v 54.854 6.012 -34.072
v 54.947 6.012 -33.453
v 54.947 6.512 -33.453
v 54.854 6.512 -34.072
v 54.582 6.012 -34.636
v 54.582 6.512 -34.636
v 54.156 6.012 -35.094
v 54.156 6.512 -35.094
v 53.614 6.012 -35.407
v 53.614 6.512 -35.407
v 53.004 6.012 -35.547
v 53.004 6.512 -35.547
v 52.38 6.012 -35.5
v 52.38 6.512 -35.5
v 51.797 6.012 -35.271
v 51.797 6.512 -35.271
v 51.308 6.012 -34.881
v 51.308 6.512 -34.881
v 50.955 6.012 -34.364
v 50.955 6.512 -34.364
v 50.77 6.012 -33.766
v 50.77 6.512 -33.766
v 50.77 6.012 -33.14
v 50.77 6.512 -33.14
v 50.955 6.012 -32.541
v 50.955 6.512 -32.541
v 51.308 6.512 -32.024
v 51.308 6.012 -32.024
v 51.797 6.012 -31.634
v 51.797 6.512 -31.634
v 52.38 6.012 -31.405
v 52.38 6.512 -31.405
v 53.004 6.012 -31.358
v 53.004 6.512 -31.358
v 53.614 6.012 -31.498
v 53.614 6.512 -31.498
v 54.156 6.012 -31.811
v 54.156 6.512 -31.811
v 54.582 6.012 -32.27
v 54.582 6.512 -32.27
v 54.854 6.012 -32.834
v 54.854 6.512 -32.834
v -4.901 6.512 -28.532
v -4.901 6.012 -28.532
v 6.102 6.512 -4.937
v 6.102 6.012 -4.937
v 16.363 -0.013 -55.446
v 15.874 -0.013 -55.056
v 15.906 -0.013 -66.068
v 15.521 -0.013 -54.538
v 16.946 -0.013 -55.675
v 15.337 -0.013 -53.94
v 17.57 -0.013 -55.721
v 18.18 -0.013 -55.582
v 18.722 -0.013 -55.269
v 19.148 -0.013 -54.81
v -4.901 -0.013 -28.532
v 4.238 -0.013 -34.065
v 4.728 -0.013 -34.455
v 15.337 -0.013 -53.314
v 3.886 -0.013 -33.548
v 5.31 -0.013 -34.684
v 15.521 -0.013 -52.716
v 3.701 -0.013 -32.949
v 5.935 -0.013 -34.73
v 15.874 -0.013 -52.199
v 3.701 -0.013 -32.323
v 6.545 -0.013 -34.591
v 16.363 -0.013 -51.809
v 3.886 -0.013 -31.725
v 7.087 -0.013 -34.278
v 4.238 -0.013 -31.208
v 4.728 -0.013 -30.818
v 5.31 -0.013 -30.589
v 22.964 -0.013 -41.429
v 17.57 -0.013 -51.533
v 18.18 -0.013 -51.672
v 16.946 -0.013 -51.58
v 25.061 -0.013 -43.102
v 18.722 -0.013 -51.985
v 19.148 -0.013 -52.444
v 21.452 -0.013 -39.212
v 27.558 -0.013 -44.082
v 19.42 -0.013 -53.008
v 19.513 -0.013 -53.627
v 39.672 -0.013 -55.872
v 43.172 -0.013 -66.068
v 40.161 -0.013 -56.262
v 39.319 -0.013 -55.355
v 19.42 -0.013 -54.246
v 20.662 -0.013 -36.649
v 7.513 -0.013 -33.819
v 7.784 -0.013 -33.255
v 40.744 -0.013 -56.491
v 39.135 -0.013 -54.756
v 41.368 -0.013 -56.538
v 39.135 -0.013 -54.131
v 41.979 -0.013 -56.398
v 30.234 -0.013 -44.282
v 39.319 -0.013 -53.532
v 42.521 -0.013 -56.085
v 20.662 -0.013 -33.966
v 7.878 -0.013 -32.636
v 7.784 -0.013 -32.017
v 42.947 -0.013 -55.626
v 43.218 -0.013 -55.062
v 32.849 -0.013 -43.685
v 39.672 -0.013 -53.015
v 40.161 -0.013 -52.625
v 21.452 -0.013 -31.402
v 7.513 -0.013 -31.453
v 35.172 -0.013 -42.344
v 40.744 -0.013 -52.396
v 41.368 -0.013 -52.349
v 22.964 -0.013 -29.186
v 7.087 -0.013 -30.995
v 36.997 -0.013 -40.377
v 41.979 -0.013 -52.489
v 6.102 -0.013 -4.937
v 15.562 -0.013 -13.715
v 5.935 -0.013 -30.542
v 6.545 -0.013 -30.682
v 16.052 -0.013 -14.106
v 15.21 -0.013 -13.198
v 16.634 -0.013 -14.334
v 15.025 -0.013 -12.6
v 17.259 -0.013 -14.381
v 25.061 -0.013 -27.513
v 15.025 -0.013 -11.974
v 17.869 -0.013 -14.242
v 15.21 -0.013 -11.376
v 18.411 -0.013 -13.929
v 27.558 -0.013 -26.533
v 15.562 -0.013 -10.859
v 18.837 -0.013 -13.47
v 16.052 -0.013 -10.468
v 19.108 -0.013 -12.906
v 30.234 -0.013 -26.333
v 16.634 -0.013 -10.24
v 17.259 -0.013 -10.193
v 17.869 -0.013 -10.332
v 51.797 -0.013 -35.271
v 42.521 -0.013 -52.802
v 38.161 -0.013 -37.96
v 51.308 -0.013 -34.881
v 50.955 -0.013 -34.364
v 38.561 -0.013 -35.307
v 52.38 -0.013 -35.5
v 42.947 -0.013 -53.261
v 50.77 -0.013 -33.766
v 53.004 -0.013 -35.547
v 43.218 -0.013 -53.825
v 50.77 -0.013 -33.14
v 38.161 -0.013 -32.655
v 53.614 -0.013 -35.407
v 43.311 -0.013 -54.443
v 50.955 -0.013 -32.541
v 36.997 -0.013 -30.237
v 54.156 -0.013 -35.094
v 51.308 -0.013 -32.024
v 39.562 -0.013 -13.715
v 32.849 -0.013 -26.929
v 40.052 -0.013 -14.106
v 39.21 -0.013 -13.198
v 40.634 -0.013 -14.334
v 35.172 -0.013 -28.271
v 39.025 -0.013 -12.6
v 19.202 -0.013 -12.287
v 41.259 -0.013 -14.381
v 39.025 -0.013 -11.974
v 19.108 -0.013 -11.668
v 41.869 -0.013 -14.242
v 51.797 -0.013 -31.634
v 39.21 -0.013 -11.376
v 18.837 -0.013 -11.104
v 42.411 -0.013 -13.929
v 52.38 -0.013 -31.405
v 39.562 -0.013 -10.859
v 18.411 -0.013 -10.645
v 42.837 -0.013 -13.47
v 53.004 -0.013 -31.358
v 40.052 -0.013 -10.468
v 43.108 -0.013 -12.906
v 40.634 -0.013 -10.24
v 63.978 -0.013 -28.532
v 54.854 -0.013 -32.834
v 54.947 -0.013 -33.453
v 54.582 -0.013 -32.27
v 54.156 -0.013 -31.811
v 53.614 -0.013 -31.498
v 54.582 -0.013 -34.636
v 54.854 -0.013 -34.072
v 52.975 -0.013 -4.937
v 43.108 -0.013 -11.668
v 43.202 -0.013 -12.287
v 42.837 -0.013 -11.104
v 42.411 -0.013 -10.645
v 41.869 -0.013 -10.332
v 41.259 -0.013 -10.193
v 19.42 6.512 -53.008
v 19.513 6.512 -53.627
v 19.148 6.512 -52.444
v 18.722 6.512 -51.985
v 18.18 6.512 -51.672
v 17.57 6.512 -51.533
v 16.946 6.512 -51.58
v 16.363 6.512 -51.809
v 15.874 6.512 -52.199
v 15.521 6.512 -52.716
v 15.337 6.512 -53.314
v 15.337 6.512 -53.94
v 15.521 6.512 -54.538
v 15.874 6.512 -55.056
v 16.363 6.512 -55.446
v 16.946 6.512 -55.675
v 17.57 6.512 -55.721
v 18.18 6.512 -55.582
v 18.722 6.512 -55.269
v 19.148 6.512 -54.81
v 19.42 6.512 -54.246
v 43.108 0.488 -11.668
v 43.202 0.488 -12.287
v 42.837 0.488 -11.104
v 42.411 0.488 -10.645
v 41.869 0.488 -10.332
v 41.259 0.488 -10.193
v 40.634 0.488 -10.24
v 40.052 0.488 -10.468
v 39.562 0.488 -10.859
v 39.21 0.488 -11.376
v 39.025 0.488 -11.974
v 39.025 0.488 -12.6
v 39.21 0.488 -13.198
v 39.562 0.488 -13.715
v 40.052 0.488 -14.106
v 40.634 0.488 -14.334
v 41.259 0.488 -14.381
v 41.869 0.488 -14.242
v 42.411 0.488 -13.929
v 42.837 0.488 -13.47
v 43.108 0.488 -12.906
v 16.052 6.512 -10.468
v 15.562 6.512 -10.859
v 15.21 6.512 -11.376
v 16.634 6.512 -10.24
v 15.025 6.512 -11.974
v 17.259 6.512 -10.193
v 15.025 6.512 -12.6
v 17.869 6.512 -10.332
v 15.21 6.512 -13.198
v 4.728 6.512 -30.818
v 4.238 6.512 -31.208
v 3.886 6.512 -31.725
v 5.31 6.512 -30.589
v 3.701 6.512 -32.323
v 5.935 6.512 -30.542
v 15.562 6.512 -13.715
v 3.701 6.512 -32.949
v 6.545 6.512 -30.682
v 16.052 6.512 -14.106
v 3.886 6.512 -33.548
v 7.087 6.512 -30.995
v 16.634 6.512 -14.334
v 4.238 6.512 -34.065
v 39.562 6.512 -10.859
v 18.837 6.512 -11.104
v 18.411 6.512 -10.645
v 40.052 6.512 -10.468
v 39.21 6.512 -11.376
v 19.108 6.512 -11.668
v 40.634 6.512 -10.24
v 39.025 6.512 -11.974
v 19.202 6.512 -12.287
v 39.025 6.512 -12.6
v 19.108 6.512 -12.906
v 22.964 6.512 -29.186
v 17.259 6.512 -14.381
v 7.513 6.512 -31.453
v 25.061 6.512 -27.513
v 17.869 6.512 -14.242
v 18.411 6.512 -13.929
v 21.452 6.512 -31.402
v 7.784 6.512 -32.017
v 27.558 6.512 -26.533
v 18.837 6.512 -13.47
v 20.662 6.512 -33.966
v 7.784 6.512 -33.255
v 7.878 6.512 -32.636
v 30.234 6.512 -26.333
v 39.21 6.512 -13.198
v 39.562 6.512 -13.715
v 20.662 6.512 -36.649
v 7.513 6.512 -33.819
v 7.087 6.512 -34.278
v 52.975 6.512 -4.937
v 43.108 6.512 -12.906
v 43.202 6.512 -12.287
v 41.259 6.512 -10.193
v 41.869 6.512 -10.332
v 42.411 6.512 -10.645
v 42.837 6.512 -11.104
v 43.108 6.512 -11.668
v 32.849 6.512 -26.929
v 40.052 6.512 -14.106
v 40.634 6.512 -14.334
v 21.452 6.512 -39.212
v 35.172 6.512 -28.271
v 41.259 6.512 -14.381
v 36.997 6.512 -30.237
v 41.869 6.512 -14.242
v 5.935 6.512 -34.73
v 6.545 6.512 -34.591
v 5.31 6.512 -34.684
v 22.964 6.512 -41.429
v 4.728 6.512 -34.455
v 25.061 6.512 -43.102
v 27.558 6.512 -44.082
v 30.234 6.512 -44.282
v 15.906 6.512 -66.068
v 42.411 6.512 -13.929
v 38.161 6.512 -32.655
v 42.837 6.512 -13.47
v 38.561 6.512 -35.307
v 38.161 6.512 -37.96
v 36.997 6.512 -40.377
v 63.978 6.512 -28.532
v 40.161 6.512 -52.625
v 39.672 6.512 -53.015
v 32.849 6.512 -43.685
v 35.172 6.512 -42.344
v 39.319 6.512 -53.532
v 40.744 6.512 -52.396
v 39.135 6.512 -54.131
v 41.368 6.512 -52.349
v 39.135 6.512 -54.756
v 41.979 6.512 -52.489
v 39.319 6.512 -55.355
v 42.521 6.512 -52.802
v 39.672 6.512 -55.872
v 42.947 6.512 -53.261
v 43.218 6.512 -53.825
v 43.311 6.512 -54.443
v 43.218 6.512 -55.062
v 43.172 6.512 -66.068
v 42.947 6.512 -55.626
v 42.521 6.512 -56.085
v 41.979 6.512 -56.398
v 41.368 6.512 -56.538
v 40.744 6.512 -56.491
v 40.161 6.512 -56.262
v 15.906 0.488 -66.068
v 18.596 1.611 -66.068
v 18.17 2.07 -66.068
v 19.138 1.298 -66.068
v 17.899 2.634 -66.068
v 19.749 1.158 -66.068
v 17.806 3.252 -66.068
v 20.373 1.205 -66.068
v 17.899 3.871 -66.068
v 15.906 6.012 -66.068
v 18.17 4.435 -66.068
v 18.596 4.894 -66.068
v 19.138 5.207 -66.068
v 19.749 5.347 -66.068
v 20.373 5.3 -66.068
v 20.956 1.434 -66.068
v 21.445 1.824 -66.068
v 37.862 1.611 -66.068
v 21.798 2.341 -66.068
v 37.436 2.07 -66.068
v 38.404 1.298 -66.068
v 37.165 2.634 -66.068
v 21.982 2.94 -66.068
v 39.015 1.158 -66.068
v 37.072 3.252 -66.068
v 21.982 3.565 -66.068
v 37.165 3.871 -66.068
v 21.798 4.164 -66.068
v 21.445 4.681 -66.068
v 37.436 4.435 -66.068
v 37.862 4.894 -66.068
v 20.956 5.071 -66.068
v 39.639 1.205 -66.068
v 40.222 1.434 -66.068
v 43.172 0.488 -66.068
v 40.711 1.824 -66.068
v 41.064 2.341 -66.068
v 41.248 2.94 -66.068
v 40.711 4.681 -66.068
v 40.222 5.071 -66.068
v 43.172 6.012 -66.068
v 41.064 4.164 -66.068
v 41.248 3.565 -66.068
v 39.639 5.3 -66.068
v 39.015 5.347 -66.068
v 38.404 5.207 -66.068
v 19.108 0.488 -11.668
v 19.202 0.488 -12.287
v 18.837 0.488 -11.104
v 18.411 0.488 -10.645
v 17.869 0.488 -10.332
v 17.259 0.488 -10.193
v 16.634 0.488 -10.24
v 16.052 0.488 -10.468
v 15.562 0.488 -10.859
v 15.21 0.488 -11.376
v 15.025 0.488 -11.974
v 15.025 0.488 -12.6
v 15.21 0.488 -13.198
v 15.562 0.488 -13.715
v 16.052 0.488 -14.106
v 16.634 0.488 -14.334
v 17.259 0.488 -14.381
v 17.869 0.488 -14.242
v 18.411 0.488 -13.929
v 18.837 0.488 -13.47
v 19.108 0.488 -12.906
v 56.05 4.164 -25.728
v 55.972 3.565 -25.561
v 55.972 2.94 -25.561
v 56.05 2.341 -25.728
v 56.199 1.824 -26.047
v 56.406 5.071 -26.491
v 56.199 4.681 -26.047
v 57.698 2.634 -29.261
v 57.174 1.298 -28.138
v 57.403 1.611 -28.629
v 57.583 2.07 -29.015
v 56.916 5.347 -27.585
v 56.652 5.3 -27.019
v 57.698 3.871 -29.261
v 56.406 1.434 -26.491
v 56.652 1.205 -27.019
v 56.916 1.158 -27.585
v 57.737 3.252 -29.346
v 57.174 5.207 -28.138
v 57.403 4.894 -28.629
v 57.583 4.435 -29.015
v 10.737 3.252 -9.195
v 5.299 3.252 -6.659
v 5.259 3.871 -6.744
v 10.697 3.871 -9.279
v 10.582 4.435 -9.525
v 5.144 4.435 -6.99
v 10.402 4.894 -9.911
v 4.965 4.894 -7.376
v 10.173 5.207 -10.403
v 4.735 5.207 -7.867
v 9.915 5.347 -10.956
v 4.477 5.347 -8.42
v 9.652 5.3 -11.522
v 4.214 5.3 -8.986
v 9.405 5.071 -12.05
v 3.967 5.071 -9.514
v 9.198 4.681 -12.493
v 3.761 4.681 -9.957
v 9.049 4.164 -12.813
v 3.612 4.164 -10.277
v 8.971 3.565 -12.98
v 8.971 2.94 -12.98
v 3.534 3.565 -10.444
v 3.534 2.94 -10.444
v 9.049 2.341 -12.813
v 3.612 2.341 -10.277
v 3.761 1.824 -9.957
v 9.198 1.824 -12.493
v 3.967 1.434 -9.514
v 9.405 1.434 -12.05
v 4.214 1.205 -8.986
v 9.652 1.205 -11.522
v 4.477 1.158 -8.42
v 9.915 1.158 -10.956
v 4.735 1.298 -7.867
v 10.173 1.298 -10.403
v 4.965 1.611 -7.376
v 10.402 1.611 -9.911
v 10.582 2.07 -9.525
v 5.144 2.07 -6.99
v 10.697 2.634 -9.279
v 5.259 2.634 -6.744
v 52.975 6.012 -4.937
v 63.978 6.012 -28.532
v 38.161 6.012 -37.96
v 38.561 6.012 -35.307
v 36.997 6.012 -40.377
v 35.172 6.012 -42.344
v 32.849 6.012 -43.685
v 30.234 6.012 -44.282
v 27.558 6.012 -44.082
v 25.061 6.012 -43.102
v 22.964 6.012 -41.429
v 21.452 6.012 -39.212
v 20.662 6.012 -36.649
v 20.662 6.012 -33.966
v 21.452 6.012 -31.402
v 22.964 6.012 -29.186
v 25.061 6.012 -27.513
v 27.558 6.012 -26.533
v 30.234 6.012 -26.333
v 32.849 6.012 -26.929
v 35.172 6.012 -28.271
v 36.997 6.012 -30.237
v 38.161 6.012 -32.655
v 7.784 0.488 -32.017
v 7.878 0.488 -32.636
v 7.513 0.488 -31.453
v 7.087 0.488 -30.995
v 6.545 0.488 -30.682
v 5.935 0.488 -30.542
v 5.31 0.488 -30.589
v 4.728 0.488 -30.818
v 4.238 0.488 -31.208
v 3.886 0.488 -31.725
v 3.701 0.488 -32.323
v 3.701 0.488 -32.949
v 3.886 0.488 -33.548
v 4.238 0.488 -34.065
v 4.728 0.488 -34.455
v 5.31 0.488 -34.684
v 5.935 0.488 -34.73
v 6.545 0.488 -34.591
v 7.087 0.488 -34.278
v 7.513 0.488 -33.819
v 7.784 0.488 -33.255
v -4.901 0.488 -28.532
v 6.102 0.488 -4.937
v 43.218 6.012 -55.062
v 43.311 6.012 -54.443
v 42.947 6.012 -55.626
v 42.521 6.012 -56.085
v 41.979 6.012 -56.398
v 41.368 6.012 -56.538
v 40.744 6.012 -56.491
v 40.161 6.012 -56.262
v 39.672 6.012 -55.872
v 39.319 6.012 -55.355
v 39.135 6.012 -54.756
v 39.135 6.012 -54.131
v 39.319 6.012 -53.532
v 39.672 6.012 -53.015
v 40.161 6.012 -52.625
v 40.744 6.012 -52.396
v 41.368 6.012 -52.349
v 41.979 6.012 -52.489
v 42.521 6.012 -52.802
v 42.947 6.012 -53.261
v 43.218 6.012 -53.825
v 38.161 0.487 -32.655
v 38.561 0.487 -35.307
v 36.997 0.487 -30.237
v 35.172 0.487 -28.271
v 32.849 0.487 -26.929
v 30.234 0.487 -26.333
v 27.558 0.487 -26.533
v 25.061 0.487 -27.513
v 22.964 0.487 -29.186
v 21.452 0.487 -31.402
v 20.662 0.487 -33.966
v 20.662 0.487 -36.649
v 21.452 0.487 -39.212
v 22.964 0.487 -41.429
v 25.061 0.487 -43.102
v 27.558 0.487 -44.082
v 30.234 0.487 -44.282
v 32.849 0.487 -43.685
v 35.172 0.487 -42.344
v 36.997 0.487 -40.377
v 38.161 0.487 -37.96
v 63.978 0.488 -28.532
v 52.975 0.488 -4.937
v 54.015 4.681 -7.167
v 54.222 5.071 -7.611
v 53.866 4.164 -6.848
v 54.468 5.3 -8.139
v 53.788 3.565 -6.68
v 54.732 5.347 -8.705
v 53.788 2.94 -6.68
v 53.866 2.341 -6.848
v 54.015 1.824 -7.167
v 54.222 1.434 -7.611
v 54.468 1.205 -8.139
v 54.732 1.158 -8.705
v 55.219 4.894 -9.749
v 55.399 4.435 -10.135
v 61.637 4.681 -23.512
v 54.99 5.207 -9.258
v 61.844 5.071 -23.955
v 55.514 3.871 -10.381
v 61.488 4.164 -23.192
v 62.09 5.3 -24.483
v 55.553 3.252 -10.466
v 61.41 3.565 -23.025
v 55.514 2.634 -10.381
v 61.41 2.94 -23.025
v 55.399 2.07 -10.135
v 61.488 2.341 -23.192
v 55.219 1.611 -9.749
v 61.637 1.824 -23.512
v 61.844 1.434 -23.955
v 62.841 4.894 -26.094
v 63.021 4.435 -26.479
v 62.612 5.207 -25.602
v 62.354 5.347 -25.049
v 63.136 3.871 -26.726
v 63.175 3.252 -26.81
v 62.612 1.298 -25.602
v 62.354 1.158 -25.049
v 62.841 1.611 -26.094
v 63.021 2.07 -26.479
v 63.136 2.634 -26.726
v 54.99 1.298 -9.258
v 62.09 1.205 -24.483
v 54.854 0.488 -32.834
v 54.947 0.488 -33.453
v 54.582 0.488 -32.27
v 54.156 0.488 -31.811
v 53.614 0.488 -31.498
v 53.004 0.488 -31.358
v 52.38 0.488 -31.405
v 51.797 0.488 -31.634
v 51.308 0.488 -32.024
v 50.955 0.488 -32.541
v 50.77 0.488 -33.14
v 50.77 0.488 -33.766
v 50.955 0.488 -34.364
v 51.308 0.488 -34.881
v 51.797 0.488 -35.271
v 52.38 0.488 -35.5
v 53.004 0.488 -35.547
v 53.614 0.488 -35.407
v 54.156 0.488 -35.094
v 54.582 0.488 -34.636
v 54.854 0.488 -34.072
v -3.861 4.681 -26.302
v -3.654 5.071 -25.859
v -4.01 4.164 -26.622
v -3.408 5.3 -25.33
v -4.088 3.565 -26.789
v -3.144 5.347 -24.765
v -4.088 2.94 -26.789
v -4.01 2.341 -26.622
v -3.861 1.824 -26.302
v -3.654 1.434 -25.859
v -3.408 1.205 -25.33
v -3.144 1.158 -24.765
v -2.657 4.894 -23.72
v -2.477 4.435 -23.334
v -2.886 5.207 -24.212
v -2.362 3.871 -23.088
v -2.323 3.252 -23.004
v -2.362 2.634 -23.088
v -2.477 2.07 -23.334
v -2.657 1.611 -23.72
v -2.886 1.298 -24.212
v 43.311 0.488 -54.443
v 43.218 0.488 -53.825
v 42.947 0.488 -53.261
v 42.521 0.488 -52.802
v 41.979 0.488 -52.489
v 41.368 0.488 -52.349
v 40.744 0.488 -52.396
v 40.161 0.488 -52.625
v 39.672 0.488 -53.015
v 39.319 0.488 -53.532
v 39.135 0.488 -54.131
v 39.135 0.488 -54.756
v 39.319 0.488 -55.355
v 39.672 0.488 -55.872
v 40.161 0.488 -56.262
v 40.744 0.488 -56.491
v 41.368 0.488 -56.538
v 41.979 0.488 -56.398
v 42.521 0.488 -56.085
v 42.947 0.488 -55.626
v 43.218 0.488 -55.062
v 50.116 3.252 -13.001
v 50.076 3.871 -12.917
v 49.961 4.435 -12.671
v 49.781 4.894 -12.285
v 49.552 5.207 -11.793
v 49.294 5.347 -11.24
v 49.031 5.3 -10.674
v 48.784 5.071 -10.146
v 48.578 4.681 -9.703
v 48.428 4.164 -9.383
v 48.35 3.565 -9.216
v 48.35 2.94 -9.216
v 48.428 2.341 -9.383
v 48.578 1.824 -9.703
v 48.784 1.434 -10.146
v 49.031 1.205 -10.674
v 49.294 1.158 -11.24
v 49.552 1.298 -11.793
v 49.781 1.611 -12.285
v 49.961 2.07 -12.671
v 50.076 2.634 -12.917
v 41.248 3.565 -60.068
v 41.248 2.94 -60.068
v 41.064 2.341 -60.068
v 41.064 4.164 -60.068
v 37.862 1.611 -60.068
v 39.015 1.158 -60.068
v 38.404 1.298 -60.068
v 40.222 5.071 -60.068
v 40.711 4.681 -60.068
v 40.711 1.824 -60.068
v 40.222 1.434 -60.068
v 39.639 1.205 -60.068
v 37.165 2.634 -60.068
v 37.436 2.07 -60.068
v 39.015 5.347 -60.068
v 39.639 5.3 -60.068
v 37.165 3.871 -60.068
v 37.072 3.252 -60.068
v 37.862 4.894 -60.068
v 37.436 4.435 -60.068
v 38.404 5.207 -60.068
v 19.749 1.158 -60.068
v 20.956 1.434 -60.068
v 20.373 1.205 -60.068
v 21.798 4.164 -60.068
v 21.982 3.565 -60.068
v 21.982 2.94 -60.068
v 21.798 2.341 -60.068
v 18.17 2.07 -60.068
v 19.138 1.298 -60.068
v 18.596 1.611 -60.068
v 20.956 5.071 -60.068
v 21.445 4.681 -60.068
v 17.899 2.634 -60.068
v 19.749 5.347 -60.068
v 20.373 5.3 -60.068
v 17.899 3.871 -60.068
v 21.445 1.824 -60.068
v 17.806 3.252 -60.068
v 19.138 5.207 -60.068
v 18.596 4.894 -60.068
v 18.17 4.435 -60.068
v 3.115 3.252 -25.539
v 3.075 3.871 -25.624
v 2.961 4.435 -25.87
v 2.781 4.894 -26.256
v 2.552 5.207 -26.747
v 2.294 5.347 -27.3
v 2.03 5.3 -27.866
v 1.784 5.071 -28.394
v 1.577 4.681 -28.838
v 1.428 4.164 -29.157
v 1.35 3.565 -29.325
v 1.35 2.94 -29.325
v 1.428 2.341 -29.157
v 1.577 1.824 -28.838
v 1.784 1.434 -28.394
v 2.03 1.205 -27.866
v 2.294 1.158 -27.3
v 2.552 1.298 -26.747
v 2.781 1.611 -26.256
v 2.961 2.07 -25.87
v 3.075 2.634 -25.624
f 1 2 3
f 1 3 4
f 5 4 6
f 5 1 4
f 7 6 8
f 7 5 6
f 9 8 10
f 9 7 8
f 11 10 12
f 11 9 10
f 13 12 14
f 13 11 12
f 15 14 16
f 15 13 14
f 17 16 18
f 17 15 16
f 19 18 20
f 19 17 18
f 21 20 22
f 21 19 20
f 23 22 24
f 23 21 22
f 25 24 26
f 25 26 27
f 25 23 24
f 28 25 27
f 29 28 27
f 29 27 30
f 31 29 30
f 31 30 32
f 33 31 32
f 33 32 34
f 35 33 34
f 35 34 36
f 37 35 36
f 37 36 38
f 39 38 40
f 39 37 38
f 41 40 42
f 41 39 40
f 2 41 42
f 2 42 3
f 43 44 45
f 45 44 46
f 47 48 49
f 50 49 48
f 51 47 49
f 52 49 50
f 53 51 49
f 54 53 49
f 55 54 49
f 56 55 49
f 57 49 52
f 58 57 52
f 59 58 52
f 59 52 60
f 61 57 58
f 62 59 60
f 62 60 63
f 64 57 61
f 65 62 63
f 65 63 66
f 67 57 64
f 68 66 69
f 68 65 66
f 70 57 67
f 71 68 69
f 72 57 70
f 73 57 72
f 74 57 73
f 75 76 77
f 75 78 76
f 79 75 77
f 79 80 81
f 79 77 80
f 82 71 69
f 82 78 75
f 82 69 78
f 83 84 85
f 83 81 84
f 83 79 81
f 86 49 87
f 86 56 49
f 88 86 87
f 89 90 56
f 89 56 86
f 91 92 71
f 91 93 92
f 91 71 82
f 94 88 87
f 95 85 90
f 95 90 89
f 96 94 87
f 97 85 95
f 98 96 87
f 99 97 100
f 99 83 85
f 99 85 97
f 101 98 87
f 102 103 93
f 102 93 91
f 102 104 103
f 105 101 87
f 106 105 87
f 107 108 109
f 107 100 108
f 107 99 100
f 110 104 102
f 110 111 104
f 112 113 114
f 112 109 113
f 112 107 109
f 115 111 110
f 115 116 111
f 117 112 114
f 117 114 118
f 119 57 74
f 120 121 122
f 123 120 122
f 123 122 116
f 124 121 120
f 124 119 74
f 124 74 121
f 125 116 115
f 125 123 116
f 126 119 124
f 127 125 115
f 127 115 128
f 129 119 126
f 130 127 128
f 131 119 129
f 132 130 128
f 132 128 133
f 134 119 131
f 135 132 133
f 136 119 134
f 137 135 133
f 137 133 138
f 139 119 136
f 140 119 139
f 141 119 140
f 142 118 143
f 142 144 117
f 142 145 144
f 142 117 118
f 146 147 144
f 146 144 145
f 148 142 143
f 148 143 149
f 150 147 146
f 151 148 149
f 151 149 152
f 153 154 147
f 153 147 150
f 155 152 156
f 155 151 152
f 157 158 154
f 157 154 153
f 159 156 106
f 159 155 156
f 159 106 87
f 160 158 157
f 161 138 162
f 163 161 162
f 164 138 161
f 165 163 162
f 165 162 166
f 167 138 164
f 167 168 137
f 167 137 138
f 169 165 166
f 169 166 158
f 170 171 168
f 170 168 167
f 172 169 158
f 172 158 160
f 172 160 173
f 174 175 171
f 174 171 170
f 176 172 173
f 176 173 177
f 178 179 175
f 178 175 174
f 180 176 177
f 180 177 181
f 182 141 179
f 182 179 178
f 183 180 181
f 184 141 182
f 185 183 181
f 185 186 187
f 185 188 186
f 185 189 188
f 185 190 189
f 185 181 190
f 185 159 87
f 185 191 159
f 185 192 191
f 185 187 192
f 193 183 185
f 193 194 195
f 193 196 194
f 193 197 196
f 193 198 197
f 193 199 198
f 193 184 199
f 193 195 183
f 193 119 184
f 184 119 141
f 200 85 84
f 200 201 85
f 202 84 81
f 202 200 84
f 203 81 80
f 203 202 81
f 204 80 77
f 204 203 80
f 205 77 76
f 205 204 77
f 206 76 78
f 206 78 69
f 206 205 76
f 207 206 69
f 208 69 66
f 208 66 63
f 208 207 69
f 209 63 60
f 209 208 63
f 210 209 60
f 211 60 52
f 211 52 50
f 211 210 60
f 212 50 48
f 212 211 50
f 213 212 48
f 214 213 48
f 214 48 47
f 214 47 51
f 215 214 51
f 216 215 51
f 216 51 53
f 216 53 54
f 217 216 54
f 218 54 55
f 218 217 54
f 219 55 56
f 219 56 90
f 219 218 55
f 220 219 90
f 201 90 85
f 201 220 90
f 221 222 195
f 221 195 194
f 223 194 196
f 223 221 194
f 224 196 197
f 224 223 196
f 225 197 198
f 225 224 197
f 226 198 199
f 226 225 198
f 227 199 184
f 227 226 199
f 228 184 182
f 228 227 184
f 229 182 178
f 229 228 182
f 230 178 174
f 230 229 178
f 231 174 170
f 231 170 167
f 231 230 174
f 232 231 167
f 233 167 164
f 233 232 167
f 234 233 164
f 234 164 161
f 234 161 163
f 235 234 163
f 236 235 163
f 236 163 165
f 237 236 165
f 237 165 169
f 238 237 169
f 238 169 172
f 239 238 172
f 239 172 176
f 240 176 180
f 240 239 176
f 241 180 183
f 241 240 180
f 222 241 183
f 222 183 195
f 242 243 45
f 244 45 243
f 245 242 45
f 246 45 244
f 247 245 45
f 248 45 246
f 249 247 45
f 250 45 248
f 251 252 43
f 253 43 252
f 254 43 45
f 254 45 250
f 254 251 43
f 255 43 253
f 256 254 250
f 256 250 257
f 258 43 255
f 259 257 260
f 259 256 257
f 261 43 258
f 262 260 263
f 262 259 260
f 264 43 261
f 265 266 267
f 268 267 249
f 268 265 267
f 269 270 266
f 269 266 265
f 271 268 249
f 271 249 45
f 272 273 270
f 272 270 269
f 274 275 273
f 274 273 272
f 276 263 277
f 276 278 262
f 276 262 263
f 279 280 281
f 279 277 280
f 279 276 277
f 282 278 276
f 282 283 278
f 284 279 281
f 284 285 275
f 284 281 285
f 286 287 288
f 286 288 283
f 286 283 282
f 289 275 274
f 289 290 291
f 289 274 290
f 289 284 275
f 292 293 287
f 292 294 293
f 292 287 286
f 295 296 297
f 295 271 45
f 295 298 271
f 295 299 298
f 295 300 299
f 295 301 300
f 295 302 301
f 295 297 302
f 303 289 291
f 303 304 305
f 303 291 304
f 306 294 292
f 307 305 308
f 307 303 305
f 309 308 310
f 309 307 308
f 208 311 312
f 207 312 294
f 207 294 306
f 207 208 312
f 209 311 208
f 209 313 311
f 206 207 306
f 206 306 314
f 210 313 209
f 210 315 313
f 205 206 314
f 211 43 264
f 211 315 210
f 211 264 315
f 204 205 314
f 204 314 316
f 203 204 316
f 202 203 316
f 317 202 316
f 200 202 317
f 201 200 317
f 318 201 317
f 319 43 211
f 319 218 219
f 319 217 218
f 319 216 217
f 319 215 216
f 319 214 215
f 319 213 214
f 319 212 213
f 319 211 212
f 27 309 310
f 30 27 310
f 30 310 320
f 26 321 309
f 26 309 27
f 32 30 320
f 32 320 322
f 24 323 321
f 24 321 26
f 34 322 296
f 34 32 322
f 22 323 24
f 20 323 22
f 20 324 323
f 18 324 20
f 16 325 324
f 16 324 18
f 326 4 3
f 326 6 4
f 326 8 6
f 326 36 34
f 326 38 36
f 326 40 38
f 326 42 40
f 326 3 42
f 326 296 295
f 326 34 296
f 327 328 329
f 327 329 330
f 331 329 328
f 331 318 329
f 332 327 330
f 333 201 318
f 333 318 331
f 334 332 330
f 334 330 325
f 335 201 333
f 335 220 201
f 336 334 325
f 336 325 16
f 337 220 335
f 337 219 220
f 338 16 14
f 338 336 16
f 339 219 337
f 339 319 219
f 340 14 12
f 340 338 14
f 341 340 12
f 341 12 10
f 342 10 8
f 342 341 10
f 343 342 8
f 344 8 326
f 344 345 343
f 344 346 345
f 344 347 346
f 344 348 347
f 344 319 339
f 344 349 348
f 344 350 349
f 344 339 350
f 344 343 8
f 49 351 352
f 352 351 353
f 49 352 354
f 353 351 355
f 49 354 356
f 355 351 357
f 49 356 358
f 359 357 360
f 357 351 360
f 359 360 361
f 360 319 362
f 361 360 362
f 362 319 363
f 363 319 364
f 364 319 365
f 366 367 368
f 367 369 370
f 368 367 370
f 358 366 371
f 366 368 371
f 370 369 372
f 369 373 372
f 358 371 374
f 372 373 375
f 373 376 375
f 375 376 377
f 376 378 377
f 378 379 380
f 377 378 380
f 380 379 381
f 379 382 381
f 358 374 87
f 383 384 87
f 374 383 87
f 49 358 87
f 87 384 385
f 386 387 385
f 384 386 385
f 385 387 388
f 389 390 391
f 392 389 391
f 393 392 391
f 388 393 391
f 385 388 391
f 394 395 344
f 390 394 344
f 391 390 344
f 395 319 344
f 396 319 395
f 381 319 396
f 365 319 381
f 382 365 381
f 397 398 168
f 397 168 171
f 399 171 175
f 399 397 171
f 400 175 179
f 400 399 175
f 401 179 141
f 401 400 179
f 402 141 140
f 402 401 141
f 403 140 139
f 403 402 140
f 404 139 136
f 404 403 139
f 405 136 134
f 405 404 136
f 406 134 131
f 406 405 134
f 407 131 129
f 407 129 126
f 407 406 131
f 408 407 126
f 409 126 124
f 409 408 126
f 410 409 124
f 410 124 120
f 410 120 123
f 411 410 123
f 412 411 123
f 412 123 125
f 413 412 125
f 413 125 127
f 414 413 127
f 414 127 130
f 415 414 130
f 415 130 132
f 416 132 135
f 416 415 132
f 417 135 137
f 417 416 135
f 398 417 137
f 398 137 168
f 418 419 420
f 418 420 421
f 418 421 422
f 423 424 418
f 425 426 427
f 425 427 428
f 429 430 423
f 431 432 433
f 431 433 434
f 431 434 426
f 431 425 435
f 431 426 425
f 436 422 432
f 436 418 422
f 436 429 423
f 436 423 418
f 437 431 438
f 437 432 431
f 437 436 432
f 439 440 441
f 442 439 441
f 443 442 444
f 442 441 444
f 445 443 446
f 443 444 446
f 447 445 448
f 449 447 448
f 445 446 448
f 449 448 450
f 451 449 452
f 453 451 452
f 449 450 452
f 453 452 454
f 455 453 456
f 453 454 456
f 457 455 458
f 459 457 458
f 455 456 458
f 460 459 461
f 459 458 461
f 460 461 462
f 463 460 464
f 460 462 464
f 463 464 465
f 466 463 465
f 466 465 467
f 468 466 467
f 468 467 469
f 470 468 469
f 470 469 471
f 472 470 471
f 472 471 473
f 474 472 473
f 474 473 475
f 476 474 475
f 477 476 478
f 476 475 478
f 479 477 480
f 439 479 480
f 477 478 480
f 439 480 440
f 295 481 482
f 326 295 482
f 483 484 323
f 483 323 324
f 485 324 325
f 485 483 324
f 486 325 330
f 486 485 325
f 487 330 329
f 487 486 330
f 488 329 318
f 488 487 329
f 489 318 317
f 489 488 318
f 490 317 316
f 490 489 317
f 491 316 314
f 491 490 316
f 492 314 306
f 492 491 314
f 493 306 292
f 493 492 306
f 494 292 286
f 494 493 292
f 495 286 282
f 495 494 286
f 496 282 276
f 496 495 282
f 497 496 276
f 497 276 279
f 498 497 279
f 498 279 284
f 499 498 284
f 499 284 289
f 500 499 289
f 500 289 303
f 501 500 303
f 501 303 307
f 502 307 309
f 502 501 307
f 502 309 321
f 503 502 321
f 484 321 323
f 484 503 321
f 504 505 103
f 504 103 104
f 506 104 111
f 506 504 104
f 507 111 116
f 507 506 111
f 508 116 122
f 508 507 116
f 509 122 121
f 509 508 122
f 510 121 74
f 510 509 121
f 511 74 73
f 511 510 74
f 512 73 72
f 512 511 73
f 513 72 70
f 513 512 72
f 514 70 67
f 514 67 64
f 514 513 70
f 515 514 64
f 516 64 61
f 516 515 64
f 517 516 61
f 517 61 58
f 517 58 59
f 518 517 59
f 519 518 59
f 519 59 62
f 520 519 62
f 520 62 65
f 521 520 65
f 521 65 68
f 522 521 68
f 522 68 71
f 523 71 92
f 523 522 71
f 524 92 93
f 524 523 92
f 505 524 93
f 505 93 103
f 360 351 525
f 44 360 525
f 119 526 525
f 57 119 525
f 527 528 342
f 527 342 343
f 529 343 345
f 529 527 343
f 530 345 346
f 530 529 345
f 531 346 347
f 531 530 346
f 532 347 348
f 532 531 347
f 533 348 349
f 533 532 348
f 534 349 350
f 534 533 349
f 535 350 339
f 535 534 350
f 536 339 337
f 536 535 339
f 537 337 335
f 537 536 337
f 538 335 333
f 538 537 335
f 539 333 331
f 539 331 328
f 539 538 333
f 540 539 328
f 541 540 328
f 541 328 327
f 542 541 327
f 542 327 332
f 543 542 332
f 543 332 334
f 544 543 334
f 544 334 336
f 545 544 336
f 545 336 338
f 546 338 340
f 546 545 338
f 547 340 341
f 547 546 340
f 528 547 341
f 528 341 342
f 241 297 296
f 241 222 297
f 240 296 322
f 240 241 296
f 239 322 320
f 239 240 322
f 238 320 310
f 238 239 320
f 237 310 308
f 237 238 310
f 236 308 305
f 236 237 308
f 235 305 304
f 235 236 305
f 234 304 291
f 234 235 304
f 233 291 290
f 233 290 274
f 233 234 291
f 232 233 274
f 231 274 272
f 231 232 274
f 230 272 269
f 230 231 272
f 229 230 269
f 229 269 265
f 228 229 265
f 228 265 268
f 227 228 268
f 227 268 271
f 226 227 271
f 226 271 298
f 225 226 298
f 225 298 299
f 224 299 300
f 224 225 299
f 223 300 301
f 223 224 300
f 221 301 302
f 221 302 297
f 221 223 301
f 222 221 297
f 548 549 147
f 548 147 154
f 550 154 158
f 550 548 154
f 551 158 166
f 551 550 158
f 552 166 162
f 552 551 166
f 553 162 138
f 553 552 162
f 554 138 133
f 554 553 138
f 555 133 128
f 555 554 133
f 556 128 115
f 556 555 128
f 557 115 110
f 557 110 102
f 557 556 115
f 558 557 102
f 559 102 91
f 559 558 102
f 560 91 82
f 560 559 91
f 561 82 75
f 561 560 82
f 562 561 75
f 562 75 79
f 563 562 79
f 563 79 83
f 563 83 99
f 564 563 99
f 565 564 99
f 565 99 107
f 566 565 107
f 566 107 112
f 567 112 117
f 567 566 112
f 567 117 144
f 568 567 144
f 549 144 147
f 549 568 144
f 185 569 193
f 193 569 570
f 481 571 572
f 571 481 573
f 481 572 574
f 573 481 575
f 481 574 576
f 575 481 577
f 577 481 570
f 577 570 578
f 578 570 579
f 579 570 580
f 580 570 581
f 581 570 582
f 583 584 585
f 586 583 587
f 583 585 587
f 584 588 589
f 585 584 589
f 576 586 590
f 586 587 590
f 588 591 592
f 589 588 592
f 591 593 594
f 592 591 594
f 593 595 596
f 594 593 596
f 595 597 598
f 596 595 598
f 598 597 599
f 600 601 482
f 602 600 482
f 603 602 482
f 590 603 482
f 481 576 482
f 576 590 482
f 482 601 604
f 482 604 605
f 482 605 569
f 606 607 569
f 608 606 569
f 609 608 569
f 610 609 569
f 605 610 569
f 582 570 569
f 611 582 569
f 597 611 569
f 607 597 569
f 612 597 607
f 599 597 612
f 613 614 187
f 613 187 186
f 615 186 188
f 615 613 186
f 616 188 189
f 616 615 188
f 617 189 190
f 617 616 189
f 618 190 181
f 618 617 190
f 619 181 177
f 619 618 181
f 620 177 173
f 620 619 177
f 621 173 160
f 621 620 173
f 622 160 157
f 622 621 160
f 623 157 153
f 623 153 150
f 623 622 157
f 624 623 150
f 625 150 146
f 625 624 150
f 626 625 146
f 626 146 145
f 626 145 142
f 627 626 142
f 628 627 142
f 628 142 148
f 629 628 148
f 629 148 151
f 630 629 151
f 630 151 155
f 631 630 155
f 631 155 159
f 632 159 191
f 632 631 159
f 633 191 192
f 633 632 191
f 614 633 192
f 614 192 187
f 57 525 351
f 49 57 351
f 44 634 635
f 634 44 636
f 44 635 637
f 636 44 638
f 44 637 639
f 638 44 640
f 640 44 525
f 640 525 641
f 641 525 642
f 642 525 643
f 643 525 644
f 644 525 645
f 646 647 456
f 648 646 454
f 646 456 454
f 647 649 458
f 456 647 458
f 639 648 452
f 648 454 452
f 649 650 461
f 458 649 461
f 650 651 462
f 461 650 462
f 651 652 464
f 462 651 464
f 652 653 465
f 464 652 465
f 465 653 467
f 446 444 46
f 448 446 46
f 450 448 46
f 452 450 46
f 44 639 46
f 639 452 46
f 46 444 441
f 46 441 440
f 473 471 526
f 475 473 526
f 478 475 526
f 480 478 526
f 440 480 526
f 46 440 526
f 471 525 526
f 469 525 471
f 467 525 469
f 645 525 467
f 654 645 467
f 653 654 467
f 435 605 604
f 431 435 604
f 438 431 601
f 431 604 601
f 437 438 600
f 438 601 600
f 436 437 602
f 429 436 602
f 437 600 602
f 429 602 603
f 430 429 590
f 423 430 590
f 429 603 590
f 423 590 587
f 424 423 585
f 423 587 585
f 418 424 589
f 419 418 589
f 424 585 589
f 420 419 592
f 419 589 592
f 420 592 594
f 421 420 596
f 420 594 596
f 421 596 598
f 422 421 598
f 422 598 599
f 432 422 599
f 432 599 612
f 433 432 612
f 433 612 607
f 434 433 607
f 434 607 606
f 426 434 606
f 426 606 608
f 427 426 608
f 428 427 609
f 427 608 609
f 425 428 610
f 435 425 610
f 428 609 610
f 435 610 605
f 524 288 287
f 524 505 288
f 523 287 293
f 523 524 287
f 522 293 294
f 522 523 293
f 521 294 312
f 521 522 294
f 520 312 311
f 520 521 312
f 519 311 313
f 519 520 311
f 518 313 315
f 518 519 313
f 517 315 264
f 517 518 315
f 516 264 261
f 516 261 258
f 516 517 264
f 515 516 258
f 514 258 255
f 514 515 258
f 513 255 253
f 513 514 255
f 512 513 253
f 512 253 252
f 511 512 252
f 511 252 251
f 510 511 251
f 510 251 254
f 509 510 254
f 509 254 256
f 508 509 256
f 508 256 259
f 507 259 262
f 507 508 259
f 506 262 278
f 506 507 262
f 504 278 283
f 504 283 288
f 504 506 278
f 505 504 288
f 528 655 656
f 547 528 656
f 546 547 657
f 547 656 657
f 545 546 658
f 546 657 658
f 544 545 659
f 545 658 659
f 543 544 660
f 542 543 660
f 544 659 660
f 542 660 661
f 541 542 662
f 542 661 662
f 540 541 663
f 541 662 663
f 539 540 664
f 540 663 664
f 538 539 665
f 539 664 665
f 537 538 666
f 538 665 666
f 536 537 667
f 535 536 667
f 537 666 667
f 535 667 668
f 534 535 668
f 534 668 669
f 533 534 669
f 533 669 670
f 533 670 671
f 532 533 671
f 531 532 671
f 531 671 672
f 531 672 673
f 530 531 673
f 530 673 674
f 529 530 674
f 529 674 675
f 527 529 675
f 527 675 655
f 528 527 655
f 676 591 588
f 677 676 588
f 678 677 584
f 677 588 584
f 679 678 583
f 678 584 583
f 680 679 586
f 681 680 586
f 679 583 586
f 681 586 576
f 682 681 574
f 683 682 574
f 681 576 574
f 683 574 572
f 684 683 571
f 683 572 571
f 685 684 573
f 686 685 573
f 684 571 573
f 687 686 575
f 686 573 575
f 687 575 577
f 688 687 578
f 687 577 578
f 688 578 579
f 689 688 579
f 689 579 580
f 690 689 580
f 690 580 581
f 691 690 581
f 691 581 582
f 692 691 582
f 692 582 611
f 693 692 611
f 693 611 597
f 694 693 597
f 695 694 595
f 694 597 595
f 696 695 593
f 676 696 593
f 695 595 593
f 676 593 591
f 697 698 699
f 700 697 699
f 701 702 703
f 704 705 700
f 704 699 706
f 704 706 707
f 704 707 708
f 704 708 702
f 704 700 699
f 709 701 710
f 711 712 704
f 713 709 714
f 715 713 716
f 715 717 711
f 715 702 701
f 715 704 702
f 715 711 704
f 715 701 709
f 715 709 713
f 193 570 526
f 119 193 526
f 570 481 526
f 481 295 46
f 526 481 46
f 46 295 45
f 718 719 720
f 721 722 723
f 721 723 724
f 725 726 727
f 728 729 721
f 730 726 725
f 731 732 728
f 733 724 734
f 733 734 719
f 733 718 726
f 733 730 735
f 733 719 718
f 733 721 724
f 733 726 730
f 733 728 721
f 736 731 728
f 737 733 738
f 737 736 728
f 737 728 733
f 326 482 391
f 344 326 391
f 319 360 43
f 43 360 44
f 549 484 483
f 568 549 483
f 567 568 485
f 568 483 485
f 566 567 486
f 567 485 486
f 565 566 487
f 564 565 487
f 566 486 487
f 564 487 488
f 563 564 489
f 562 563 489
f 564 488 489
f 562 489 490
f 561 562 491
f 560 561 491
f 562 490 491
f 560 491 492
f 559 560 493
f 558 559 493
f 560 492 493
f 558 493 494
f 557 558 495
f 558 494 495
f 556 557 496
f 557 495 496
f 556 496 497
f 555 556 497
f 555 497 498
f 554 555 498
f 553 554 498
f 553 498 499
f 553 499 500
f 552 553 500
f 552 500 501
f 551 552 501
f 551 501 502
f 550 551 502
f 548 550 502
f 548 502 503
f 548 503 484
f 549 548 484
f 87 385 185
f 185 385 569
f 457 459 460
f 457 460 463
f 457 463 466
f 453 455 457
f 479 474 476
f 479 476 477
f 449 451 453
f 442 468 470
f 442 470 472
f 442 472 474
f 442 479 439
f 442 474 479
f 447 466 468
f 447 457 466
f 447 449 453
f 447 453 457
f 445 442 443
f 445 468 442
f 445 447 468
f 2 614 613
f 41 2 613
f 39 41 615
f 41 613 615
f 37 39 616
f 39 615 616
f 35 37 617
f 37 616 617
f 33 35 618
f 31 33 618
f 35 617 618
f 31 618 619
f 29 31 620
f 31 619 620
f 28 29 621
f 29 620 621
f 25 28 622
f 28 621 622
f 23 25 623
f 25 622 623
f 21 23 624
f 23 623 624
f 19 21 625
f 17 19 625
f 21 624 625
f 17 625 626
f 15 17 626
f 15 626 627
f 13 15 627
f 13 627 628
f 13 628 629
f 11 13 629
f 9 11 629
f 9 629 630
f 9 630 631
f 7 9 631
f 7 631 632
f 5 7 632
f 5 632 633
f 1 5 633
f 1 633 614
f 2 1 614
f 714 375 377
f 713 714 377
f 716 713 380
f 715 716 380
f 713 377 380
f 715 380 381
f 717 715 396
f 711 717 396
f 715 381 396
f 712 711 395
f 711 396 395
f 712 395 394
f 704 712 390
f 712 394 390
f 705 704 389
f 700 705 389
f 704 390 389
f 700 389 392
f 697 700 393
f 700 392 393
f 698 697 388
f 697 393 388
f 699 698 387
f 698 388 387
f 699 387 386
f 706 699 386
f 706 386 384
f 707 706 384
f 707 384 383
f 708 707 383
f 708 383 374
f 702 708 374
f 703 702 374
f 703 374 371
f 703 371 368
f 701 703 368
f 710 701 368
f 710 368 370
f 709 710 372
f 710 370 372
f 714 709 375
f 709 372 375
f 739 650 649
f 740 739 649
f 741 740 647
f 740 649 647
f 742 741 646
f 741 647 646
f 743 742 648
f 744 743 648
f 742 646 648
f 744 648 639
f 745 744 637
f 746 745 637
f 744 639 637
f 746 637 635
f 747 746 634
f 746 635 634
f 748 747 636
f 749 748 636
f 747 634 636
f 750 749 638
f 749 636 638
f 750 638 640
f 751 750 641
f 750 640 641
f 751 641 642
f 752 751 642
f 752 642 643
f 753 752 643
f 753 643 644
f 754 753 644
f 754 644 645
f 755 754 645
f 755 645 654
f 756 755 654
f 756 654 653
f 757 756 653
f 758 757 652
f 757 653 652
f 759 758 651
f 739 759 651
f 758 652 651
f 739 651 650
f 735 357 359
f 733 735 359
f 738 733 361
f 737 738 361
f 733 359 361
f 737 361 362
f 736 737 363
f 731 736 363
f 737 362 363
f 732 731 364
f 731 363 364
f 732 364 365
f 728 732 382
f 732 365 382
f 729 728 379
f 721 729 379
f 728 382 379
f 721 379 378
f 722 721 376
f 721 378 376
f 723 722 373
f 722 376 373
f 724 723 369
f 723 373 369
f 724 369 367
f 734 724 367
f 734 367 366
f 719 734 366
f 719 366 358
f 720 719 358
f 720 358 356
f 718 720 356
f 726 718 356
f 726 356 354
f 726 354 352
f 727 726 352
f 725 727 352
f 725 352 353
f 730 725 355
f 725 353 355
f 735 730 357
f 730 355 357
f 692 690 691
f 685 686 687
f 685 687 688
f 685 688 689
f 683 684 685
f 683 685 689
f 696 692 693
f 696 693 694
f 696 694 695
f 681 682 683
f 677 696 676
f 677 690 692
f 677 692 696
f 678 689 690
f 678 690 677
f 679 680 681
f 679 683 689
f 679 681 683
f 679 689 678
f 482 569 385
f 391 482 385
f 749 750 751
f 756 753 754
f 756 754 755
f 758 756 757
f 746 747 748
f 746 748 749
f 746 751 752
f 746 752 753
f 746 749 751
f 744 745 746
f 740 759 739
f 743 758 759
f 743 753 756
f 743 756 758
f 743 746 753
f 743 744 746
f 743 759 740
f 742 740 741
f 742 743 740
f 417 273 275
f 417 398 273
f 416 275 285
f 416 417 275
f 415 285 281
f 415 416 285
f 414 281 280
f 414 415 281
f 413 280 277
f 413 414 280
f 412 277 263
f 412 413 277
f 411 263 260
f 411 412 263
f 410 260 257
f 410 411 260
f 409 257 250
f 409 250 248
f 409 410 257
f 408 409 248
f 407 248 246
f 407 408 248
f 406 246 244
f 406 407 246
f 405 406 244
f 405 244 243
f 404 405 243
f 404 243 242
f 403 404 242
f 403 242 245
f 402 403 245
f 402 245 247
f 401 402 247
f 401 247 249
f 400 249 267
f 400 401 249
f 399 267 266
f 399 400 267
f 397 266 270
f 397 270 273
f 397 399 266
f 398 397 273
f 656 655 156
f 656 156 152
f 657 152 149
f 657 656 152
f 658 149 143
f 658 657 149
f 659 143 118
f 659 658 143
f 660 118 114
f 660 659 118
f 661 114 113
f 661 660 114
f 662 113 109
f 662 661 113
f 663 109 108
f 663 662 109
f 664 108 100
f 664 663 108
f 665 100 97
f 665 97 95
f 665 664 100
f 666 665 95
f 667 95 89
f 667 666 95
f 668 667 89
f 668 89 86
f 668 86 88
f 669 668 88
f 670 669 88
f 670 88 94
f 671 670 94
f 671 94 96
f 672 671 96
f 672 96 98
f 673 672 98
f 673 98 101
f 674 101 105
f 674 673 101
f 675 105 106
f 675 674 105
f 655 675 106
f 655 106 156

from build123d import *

# Parameters (mm, degrees)
BOSS_EXTRUDE1_DEPTH = 6.5
SCALE1_SCALE        = 0.85
SKETCH2_R           = 9
CUT_EXTRUDE1_DEPTH  = 10
SKETCH7_R           = 2.1
CUT_EXTRUDE7_DEPTH  = 6
SKETCH8_R           = 2.1
CUT_EXTRUDE8_DEPTH  = 6
SKETCH9_R           = 2.1
CUT_EXTRUDE9_DEPTH  = 6
SKETCH10_R          = 2.1
CUT_EXTRUDE10_DEPTH = 10
SKETCH12_R          = 2.1
SKETCH12_R_2        = 9
BOSS_EXTRUDE2_DEPTH = 0.5
SKETCH13_R          = 2.1
SKETCH13_R_2        = 9
BOSS_EXTRUDE3_DEPTH = 0.5


with BuildPart() as part:
    # Sketch1 → Boss-Extrude1 (new body)
    with BuildSketch(Plane(origin=(0, 0, 0), x_dir=(1, 0, 0), z_dir=(0, 1, 0))):
        Polygon((1.965722873, 0), (57.111381005, 0), (70.055583492, 27.758931813), (45.577412376, 71.918721468), (13.499691502, 71.918721468), (-10.978479614, 27.758931813), align=None)
    extrude(amount=BOSS_EXTRUDE1_DEPTH)


with BuildPart() as part_1:
    # Scale1: scaled about (29.538551939, 3.25, -32.913795141)
    add(part.part.scale(SCALE1_SCALE).moved(Location((4.430782791, 0.4875, -4.937069271))))

    # Sketch2 → Cut-Extrude1 (cut)
    with BuildSketch(Plane(origin=(0, 6.0125, 0), x_dir=(1, 0, 0), z_dir=(0, 1, 0))):
        with Locations((29.561028759, 35.307348014)):
            Circle(SKETCH2_R)
    extrude(amount=-CUT_EXTRUDE1_DEPTH, mode=Mode.SUBTRACT)

    # Sketch7 → Cut-Extrude7 (cut)
    with BuildSketch(Plane(origin=(6.902862477, 0, -3.218857636), x_dir=(0.422618262, 0, 0.906307787), z_dir=(-0.906307787, 0, 0.422618262))):
        with Locations((-23.930140333, 3.2525)):
            Circle(SKETCH7_R)
        with Locations((-5.895836778, 3.2525)):
            Circle(SKETCH7_R)
    extrude(amount=-CUT_EXTRUDE7_DEPTH, mode=Mode.SUBTRACT)

    # Sketch8 → Cut-Extrude8 (cut)
    with BuildSketch(Plane(origin=(0, 0, -66.067982519), x_dir=(-1, 0, 0), z_dir=(0, 0, -1))):
        with Locations((-39.17158331, 3.2525)):
            Circle(SKETCH8_R)
        with Locations((-19.905520568, 3.2525)):
            Circle(SKETCH8_R)
    extrude(amount=-CUT_EXTRUDE8_DEPTH, mode=Mode.SUBTRACT)

    # Sketch9 → Cut-Extrude9 (cut)
    with BuildSketch(Plane(origin=(41.622704657, 0, 19.408985935), x_dir=(0.422618262, 0, -0.906307787), z_dir=(0.906307787, 0, 0.422618262))):
        with Locations((30.862899728, 3.2525)):
            Circle(SKETCH9_R)
        with Locations((48.897203282, 3.2525)):
            Circle(SKETCH9_R)
    extrude(amount=-CUT_EXTRUDE9_DEPTH, mode=Mode.SUBTRACT)

    # Sketch10 → Cut-Extrude10 (cut)
    with BuildSketch(Plane.XZ.offset(-0.4875)):
        with Locations((41.211489709, -54.443494734)):
            Circle(SKETCH10_R)
        with Locations((52.846920595, -33.452621763)):
            Circle(SKETCH10_R)
        with Locations((17.41315777, -53.627241783)):
            Circle(SKETCH10_R)
        with Locations((5.777726884, -32.636368812)):
            Circle(SKETCH10_R)
        with Locations((17.101647233, -12.287069271)):
            Circle(SKETCH10_R)
        with Locations((41.101647233, -12.287069271)):
            Circle(SKETCH10_R)
    extrude(amount=-CUT_EXTRUDE10_DEPTH, mode=Mode.SUBTRACT)

    # Sketch12 → Boss-Extrude2 (add)
    with BuildSketch(Plane(origin=(0, 6.0125, 0), x_dir=(1, 0, 0), z_dir=(0, 1, 0))):
        Polygon((-4.900924881, 28.532161313), (6.101647233, 4.937069271), (52.975456645, 4.937069271), (63.978028759, 28.532161313), (43.17158331, 66.067982519), (15.905520568, 66.067982519), align=None)
        with Locations((17.101647233, 12.287069271)):
            Circle(SKETCH12_R, mode=Mode.SUBTRACT)
        with Locations((41.211489709, 54.443494734)):
            Circle(SKETCH12_R, mode=Mode.SUBTRACT)
        with Locations((29.561028759, 35.307348014)):
            Circle(SKETCH12_R_2, mode=Mode.SUBTRACT)
        with Locations((5.777726884, 32.636368812)):
            Circle(SKETCH12_R, mode=Mode.SUBTRACT)
        with Locations((41.101647233, 12.287069271)):
            Circle(SKETCH12_R, mode=Mode.SUBTRACT)
        with Locations((52.846920595, 33.452621763)):
            Circle(SKETCH12_R, mode=Mode.SUBTRACT)
        with Locations((17.41315777, 53.627241783)):
            Circle(SKETCH12_R, mode=Mode.SUBTRACT)
    extrude(amount=BOSS_EXTRUDE2_DEPTH)

    # Sketch13 → Boss-Extrude3 (add)
    with BuildSketch(Plane.XZ.offset(-0.4875)):
        Polygon((6.101647233, -4.937069271), (-4.900924881, -28.532161313), (15.905520568, -66.067982519), (43.17158331, -66.067982519), (63.978028759, -28.532161313), (52.975456645, -4.937069271), align=None)
        with Locations((41.101647233, -12.287069271)):
            Circle(SKETCH13_R, mode=Mode.SUBTRACT)
        with Locations((17.101647233, -12.287069271)):
            Circle(SKETCH13_R, mode=Mode.SUBTRACT)
        with Locations((5.777726884, -32.636368812)):
            Circle(SKETCH13_R, mode=Mode.SUBTRACT)
        with Locations((41.211489709, -54.443494734)):
            Circle(SKETCH13_R, mode=Mode.SUBTRACT)
        with Locations((29.561028759, -35.307348014)):
            Circle(SKETCH13_R_2, mode=Mode.SUBTRACT)
        with Locations((52.846920595, -33.452621763)):
            Circle(SKETCH13_R, mode=Mode.SUBTRACT)
        with Locations((17.41315777, -53.627241783)):
            Circle(SKETCH13_R, mode=Mode.SUBTRACT)
    extrude(amount=BOSS_EXTRUDE3_DEPTH)


solid = part_1.part
